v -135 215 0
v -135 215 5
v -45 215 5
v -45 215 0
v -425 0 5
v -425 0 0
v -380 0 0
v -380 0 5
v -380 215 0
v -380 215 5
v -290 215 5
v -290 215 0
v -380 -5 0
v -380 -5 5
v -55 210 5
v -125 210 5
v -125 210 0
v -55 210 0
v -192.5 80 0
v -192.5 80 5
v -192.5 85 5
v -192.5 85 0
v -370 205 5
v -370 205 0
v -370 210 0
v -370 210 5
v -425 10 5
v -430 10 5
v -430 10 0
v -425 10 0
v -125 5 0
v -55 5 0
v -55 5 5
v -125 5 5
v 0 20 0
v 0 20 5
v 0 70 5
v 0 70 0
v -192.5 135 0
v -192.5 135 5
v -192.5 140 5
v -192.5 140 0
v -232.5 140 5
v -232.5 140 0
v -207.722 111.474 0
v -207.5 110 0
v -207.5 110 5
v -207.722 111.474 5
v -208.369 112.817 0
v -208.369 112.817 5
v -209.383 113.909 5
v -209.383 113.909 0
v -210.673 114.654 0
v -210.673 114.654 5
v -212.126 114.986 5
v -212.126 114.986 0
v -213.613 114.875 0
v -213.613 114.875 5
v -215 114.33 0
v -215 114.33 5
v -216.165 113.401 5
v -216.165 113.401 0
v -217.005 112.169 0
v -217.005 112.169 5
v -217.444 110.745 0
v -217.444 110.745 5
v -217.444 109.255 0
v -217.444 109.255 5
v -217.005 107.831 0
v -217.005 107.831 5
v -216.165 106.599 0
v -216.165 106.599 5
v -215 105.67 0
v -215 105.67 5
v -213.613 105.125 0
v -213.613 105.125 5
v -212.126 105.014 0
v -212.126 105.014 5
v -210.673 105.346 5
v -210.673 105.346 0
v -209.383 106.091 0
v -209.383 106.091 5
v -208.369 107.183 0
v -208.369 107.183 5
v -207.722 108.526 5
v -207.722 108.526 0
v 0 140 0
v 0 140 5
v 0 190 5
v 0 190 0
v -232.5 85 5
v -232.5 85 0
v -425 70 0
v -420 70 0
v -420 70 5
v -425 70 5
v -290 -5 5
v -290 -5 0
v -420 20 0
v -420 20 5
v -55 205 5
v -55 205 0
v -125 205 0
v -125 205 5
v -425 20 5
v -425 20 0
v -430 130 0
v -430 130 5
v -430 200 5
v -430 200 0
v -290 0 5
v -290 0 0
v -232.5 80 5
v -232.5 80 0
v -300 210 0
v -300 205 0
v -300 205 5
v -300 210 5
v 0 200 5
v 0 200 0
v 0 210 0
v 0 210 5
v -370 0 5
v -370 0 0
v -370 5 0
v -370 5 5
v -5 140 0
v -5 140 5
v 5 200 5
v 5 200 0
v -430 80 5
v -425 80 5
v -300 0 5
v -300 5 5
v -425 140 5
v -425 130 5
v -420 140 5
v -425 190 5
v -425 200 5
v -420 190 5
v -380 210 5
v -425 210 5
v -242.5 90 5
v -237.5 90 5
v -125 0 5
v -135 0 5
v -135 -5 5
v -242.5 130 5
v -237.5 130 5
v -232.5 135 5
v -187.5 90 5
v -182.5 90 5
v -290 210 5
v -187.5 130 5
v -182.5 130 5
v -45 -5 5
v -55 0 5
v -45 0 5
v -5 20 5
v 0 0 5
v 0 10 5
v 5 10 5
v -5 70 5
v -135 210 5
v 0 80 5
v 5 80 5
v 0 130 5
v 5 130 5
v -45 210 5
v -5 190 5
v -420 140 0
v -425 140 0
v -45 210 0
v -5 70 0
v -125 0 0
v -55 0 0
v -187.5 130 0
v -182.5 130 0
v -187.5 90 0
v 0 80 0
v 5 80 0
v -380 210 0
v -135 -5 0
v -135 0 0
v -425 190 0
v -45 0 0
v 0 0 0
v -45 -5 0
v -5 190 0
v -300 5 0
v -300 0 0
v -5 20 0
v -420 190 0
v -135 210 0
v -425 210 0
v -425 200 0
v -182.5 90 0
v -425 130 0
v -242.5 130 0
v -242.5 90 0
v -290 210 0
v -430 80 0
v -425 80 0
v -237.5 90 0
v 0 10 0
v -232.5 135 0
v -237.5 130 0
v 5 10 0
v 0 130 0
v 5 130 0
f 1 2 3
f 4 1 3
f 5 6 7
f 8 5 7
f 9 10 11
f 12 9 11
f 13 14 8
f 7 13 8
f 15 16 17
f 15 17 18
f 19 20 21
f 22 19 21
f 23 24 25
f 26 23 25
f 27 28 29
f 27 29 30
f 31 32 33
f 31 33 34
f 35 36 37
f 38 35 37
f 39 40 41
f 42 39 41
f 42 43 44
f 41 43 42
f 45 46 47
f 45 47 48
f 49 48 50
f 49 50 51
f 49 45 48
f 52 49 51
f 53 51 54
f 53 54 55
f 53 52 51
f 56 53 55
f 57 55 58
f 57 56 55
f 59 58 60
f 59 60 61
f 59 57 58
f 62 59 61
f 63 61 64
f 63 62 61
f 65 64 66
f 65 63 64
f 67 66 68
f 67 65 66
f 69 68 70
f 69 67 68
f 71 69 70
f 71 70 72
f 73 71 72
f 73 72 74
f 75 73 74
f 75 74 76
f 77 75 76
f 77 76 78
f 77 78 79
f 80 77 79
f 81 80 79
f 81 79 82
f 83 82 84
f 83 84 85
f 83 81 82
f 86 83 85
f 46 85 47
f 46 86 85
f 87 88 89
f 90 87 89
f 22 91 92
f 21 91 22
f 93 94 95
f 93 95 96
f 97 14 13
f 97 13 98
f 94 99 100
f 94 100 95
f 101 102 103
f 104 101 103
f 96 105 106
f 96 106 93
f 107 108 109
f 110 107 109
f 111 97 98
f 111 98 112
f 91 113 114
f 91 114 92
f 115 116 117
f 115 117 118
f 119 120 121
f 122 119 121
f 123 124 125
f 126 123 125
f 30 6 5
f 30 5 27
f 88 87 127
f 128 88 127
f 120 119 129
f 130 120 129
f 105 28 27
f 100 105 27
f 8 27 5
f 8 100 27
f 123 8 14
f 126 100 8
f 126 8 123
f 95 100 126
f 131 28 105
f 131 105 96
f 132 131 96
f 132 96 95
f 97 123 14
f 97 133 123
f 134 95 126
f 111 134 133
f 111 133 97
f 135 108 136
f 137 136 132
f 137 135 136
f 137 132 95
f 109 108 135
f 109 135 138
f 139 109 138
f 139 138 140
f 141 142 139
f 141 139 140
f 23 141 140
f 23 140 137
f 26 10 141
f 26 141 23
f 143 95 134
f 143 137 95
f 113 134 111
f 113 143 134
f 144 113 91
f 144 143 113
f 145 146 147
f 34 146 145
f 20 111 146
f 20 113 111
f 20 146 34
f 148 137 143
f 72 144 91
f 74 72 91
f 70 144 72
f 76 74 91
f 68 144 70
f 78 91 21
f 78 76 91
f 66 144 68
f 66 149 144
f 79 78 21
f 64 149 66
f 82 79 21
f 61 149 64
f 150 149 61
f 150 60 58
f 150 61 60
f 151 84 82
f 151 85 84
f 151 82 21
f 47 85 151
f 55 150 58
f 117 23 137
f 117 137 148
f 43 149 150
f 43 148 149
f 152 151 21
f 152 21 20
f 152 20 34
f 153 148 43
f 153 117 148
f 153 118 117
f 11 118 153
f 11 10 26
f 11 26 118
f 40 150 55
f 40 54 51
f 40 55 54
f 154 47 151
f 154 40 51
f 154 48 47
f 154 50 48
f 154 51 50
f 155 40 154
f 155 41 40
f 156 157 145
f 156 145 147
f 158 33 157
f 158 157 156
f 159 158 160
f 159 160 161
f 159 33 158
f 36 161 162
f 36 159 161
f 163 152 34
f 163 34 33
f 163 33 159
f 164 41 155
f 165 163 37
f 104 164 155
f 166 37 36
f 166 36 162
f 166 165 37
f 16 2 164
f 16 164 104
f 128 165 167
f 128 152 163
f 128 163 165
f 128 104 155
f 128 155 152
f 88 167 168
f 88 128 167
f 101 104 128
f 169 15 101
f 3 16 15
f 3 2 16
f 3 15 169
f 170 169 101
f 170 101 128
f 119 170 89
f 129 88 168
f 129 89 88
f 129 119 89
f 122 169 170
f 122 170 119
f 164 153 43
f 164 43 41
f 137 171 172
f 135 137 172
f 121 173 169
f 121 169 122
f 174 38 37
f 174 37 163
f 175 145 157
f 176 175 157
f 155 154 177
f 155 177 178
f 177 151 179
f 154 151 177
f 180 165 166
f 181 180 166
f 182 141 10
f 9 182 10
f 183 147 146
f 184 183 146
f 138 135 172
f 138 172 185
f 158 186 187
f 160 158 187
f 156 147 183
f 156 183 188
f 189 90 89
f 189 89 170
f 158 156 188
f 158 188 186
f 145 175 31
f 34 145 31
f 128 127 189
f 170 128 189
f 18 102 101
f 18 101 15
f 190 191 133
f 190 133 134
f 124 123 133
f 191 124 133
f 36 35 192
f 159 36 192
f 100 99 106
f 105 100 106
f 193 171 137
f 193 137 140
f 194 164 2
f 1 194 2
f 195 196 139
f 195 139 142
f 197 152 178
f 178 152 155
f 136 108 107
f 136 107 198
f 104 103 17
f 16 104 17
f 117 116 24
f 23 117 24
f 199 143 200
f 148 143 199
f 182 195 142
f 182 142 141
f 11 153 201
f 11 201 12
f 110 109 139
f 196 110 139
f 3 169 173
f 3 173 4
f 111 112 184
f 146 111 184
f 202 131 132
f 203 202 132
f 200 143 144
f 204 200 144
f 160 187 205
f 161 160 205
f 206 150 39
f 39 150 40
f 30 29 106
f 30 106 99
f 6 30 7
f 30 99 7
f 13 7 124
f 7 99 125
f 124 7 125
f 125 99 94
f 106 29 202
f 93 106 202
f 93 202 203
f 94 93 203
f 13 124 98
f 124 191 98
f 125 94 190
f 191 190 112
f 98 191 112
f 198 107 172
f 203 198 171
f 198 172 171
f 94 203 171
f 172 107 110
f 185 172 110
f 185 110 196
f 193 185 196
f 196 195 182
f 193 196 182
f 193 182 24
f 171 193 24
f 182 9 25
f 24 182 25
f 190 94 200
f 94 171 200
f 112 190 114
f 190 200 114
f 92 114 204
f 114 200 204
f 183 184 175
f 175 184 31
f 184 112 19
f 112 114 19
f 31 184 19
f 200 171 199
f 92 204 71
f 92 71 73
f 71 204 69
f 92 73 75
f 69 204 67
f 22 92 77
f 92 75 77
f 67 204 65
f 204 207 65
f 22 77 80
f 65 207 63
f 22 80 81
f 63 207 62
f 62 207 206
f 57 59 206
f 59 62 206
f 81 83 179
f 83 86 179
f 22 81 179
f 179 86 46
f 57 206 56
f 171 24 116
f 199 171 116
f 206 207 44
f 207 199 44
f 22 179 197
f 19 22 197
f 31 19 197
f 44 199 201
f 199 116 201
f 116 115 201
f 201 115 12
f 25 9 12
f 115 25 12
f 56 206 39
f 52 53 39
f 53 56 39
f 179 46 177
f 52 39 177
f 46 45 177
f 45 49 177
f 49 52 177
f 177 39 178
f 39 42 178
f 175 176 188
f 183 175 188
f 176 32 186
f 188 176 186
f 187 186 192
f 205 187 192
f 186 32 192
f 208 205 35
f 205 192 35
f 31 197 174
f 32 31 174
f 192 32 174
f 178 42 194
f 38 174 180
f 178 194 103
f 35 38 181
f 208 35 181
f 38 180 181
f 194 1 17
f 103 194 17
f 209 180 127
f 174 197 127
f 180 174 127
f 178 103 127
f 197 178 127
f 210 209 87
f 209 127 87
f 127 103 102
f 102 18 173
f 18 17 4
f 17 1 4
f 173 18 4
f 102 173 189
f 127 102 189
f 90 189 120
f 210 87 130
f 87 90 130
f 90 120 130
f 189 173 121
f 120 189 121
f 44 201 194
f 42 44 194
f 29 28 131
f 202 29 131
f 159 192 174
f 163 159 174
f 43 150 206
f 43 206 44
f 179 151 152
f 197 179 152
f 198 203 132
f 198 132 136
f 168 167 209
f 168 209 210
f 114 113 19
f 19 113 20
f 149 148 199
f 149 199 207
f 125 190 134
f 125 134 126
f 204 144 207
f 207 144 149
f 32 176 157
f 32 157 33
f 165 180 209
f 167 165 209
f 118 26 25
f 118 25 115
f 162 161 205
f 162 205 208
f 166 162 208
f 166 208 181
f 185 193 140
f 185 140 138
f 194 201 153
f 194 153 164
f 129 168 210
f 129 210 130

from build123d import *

# Parameters (mm, degrees)
SKETCH1_W           = 425
SKETCH1_H           = 210
SKETCH1_R           = 5
BOSS_EXTRUDE1_DEPTH = 5
SKETCH2_W           = 70
SKETCH2_H           = 5
SKETCH2_W_2         = 5
SKETCH2_H_2         = 50
CUT_EXTRUDE1_DEPTH  = 5
SKETCH3_W           = 90
SKETCH3_H           = 5
BOSS_EXTRUDE2_DEPTH = 5
SKETCH4_W           = 5
SKETCH4_H           = 70
BOSS_EXTRUDE3_DEPTH = 5
SKETCH5_W           = 5
SKETCH5_H           = 40
SKETCH5_W_2         = 40
SKETCH5_H_2         = 5
CUT_EXTRUDE2_DEPTH  = 5


with BuildPart() as part:
    # Sketch1 → Boss-Extrude1 (new body)
    with BuildSketch(Plane.XY):
        with Locations((-212.5, 105)):
            Rectangle(SKETCH1_W, SKETCH1_H)
        with Locations((-212.5, 110)):
            Circle(SKETCH1_R, mode=Mode.SUBTRACT)
    extrude(amount=BOSS_EXTRUDE1_DEPTH)

    # Sketch2 → Cut-Extrude1 (cut)
    with BuildSketch(Plane(origin=(0, 0, 0), x_dir=(-1, 0, 0), z_dir=(0, 0, -1))):
        with Locations((90, 2.5)):
            Rectangle(SKETCH2_W, SKETCH2_H)
        with Locations((2.5, 45)):
            Rectangle(SKETCH2_W_2, SKETCH2_H_2)
        with Locations((2.5, 165)):
            Rectangle(SKETCH2_W_2, SKETCH2_H_2)
        with Locations((90, 207.5)):
            Rectangle(SKETCH2_W, SKETCH2_H)
        with Locations((335, 207.5)):
            Rectangle(SKETCH2_W, SKETCH2_H)
        with Locations((422.5, 165)):
            Rectangle(SKETCH2_W_2, SKETCH2_H_2)
        with Locations((422.5, 45)):
            Rectangle(SKETCH2_W_2, SKETCH2_H_2)
        with Locations((335, 2.5)):
            Rectangle(SKETCH2_W, SKETCH2_H)
    extrude(amount=-CUT_EXTRUDE1_DEPTH, mode=Mode.SUBTRACT)

    # Sketch3 → Boss-Extrude2 (add)
    with BuildSketch(Plane.XY.offset(5)):
        with Locations((-335, 212.5)):
            Rectangle(SKETCH3_W, SKETCH3_H)
        with Locations((-90, 212.5)):
            Rectangle(SKETCH3_W, SKETCH3_H)
        with Locations((-335, -2.5)):
            Rectangle(SKETCH3_W, SKETCH3_H)
        with Locations((-90, -2.5)):
            Rectangle(SKETCH3_W, SKETCH3_H)
    extrude(amount=-BOSS_EXTRUDE2_DEPTH)

    # Sketch4 → Boss-Extrude3 (add)
    with BuildSketch(Plane.XY.offset(5)):
        with Locations((-427.5, 165)):
            Rectangle(SKETCH4_W, SKETCH4_H)
        with Locations((-427.5, 45)):
            Rectangle(SKETCH4_W, SKETCH4_H)
        with Locations((2.5, 45)):
            Rectangle(SKETCH4_W, SKETCH4_H)
        with Locations((2.5, 165)):
            Rectangle(SKETCH4_W, SKETCH4_H)
    extrude(amount=-BOSS_EXTRUDE3_DEPTH)

    # Sketch5 → Cut-Extrude2 (cut)
    with BuildSketch(Plane.XY.offset(5)):
        with Locations((-240, 110)):
            Rectangle(SKETCH5_W, SKETCH5_H)
        with Locations((-212.5, 82.5)):
            Rectangle(SKETCH5_W_2, SKETCH5_H_2)
        with Locations((-212.5, 137.5)):
            Rectangle(SKETCH5_W_2, SKETCH5_H_2)
        with Locations((-185, 110)):
            Rectangle(SKETCH5_W, SKETCH5_H)
    extrude(amount=-CUT_EXTRUDE2_DEPTH, mode=Mode.SUBTRACT)


solid = part.part
